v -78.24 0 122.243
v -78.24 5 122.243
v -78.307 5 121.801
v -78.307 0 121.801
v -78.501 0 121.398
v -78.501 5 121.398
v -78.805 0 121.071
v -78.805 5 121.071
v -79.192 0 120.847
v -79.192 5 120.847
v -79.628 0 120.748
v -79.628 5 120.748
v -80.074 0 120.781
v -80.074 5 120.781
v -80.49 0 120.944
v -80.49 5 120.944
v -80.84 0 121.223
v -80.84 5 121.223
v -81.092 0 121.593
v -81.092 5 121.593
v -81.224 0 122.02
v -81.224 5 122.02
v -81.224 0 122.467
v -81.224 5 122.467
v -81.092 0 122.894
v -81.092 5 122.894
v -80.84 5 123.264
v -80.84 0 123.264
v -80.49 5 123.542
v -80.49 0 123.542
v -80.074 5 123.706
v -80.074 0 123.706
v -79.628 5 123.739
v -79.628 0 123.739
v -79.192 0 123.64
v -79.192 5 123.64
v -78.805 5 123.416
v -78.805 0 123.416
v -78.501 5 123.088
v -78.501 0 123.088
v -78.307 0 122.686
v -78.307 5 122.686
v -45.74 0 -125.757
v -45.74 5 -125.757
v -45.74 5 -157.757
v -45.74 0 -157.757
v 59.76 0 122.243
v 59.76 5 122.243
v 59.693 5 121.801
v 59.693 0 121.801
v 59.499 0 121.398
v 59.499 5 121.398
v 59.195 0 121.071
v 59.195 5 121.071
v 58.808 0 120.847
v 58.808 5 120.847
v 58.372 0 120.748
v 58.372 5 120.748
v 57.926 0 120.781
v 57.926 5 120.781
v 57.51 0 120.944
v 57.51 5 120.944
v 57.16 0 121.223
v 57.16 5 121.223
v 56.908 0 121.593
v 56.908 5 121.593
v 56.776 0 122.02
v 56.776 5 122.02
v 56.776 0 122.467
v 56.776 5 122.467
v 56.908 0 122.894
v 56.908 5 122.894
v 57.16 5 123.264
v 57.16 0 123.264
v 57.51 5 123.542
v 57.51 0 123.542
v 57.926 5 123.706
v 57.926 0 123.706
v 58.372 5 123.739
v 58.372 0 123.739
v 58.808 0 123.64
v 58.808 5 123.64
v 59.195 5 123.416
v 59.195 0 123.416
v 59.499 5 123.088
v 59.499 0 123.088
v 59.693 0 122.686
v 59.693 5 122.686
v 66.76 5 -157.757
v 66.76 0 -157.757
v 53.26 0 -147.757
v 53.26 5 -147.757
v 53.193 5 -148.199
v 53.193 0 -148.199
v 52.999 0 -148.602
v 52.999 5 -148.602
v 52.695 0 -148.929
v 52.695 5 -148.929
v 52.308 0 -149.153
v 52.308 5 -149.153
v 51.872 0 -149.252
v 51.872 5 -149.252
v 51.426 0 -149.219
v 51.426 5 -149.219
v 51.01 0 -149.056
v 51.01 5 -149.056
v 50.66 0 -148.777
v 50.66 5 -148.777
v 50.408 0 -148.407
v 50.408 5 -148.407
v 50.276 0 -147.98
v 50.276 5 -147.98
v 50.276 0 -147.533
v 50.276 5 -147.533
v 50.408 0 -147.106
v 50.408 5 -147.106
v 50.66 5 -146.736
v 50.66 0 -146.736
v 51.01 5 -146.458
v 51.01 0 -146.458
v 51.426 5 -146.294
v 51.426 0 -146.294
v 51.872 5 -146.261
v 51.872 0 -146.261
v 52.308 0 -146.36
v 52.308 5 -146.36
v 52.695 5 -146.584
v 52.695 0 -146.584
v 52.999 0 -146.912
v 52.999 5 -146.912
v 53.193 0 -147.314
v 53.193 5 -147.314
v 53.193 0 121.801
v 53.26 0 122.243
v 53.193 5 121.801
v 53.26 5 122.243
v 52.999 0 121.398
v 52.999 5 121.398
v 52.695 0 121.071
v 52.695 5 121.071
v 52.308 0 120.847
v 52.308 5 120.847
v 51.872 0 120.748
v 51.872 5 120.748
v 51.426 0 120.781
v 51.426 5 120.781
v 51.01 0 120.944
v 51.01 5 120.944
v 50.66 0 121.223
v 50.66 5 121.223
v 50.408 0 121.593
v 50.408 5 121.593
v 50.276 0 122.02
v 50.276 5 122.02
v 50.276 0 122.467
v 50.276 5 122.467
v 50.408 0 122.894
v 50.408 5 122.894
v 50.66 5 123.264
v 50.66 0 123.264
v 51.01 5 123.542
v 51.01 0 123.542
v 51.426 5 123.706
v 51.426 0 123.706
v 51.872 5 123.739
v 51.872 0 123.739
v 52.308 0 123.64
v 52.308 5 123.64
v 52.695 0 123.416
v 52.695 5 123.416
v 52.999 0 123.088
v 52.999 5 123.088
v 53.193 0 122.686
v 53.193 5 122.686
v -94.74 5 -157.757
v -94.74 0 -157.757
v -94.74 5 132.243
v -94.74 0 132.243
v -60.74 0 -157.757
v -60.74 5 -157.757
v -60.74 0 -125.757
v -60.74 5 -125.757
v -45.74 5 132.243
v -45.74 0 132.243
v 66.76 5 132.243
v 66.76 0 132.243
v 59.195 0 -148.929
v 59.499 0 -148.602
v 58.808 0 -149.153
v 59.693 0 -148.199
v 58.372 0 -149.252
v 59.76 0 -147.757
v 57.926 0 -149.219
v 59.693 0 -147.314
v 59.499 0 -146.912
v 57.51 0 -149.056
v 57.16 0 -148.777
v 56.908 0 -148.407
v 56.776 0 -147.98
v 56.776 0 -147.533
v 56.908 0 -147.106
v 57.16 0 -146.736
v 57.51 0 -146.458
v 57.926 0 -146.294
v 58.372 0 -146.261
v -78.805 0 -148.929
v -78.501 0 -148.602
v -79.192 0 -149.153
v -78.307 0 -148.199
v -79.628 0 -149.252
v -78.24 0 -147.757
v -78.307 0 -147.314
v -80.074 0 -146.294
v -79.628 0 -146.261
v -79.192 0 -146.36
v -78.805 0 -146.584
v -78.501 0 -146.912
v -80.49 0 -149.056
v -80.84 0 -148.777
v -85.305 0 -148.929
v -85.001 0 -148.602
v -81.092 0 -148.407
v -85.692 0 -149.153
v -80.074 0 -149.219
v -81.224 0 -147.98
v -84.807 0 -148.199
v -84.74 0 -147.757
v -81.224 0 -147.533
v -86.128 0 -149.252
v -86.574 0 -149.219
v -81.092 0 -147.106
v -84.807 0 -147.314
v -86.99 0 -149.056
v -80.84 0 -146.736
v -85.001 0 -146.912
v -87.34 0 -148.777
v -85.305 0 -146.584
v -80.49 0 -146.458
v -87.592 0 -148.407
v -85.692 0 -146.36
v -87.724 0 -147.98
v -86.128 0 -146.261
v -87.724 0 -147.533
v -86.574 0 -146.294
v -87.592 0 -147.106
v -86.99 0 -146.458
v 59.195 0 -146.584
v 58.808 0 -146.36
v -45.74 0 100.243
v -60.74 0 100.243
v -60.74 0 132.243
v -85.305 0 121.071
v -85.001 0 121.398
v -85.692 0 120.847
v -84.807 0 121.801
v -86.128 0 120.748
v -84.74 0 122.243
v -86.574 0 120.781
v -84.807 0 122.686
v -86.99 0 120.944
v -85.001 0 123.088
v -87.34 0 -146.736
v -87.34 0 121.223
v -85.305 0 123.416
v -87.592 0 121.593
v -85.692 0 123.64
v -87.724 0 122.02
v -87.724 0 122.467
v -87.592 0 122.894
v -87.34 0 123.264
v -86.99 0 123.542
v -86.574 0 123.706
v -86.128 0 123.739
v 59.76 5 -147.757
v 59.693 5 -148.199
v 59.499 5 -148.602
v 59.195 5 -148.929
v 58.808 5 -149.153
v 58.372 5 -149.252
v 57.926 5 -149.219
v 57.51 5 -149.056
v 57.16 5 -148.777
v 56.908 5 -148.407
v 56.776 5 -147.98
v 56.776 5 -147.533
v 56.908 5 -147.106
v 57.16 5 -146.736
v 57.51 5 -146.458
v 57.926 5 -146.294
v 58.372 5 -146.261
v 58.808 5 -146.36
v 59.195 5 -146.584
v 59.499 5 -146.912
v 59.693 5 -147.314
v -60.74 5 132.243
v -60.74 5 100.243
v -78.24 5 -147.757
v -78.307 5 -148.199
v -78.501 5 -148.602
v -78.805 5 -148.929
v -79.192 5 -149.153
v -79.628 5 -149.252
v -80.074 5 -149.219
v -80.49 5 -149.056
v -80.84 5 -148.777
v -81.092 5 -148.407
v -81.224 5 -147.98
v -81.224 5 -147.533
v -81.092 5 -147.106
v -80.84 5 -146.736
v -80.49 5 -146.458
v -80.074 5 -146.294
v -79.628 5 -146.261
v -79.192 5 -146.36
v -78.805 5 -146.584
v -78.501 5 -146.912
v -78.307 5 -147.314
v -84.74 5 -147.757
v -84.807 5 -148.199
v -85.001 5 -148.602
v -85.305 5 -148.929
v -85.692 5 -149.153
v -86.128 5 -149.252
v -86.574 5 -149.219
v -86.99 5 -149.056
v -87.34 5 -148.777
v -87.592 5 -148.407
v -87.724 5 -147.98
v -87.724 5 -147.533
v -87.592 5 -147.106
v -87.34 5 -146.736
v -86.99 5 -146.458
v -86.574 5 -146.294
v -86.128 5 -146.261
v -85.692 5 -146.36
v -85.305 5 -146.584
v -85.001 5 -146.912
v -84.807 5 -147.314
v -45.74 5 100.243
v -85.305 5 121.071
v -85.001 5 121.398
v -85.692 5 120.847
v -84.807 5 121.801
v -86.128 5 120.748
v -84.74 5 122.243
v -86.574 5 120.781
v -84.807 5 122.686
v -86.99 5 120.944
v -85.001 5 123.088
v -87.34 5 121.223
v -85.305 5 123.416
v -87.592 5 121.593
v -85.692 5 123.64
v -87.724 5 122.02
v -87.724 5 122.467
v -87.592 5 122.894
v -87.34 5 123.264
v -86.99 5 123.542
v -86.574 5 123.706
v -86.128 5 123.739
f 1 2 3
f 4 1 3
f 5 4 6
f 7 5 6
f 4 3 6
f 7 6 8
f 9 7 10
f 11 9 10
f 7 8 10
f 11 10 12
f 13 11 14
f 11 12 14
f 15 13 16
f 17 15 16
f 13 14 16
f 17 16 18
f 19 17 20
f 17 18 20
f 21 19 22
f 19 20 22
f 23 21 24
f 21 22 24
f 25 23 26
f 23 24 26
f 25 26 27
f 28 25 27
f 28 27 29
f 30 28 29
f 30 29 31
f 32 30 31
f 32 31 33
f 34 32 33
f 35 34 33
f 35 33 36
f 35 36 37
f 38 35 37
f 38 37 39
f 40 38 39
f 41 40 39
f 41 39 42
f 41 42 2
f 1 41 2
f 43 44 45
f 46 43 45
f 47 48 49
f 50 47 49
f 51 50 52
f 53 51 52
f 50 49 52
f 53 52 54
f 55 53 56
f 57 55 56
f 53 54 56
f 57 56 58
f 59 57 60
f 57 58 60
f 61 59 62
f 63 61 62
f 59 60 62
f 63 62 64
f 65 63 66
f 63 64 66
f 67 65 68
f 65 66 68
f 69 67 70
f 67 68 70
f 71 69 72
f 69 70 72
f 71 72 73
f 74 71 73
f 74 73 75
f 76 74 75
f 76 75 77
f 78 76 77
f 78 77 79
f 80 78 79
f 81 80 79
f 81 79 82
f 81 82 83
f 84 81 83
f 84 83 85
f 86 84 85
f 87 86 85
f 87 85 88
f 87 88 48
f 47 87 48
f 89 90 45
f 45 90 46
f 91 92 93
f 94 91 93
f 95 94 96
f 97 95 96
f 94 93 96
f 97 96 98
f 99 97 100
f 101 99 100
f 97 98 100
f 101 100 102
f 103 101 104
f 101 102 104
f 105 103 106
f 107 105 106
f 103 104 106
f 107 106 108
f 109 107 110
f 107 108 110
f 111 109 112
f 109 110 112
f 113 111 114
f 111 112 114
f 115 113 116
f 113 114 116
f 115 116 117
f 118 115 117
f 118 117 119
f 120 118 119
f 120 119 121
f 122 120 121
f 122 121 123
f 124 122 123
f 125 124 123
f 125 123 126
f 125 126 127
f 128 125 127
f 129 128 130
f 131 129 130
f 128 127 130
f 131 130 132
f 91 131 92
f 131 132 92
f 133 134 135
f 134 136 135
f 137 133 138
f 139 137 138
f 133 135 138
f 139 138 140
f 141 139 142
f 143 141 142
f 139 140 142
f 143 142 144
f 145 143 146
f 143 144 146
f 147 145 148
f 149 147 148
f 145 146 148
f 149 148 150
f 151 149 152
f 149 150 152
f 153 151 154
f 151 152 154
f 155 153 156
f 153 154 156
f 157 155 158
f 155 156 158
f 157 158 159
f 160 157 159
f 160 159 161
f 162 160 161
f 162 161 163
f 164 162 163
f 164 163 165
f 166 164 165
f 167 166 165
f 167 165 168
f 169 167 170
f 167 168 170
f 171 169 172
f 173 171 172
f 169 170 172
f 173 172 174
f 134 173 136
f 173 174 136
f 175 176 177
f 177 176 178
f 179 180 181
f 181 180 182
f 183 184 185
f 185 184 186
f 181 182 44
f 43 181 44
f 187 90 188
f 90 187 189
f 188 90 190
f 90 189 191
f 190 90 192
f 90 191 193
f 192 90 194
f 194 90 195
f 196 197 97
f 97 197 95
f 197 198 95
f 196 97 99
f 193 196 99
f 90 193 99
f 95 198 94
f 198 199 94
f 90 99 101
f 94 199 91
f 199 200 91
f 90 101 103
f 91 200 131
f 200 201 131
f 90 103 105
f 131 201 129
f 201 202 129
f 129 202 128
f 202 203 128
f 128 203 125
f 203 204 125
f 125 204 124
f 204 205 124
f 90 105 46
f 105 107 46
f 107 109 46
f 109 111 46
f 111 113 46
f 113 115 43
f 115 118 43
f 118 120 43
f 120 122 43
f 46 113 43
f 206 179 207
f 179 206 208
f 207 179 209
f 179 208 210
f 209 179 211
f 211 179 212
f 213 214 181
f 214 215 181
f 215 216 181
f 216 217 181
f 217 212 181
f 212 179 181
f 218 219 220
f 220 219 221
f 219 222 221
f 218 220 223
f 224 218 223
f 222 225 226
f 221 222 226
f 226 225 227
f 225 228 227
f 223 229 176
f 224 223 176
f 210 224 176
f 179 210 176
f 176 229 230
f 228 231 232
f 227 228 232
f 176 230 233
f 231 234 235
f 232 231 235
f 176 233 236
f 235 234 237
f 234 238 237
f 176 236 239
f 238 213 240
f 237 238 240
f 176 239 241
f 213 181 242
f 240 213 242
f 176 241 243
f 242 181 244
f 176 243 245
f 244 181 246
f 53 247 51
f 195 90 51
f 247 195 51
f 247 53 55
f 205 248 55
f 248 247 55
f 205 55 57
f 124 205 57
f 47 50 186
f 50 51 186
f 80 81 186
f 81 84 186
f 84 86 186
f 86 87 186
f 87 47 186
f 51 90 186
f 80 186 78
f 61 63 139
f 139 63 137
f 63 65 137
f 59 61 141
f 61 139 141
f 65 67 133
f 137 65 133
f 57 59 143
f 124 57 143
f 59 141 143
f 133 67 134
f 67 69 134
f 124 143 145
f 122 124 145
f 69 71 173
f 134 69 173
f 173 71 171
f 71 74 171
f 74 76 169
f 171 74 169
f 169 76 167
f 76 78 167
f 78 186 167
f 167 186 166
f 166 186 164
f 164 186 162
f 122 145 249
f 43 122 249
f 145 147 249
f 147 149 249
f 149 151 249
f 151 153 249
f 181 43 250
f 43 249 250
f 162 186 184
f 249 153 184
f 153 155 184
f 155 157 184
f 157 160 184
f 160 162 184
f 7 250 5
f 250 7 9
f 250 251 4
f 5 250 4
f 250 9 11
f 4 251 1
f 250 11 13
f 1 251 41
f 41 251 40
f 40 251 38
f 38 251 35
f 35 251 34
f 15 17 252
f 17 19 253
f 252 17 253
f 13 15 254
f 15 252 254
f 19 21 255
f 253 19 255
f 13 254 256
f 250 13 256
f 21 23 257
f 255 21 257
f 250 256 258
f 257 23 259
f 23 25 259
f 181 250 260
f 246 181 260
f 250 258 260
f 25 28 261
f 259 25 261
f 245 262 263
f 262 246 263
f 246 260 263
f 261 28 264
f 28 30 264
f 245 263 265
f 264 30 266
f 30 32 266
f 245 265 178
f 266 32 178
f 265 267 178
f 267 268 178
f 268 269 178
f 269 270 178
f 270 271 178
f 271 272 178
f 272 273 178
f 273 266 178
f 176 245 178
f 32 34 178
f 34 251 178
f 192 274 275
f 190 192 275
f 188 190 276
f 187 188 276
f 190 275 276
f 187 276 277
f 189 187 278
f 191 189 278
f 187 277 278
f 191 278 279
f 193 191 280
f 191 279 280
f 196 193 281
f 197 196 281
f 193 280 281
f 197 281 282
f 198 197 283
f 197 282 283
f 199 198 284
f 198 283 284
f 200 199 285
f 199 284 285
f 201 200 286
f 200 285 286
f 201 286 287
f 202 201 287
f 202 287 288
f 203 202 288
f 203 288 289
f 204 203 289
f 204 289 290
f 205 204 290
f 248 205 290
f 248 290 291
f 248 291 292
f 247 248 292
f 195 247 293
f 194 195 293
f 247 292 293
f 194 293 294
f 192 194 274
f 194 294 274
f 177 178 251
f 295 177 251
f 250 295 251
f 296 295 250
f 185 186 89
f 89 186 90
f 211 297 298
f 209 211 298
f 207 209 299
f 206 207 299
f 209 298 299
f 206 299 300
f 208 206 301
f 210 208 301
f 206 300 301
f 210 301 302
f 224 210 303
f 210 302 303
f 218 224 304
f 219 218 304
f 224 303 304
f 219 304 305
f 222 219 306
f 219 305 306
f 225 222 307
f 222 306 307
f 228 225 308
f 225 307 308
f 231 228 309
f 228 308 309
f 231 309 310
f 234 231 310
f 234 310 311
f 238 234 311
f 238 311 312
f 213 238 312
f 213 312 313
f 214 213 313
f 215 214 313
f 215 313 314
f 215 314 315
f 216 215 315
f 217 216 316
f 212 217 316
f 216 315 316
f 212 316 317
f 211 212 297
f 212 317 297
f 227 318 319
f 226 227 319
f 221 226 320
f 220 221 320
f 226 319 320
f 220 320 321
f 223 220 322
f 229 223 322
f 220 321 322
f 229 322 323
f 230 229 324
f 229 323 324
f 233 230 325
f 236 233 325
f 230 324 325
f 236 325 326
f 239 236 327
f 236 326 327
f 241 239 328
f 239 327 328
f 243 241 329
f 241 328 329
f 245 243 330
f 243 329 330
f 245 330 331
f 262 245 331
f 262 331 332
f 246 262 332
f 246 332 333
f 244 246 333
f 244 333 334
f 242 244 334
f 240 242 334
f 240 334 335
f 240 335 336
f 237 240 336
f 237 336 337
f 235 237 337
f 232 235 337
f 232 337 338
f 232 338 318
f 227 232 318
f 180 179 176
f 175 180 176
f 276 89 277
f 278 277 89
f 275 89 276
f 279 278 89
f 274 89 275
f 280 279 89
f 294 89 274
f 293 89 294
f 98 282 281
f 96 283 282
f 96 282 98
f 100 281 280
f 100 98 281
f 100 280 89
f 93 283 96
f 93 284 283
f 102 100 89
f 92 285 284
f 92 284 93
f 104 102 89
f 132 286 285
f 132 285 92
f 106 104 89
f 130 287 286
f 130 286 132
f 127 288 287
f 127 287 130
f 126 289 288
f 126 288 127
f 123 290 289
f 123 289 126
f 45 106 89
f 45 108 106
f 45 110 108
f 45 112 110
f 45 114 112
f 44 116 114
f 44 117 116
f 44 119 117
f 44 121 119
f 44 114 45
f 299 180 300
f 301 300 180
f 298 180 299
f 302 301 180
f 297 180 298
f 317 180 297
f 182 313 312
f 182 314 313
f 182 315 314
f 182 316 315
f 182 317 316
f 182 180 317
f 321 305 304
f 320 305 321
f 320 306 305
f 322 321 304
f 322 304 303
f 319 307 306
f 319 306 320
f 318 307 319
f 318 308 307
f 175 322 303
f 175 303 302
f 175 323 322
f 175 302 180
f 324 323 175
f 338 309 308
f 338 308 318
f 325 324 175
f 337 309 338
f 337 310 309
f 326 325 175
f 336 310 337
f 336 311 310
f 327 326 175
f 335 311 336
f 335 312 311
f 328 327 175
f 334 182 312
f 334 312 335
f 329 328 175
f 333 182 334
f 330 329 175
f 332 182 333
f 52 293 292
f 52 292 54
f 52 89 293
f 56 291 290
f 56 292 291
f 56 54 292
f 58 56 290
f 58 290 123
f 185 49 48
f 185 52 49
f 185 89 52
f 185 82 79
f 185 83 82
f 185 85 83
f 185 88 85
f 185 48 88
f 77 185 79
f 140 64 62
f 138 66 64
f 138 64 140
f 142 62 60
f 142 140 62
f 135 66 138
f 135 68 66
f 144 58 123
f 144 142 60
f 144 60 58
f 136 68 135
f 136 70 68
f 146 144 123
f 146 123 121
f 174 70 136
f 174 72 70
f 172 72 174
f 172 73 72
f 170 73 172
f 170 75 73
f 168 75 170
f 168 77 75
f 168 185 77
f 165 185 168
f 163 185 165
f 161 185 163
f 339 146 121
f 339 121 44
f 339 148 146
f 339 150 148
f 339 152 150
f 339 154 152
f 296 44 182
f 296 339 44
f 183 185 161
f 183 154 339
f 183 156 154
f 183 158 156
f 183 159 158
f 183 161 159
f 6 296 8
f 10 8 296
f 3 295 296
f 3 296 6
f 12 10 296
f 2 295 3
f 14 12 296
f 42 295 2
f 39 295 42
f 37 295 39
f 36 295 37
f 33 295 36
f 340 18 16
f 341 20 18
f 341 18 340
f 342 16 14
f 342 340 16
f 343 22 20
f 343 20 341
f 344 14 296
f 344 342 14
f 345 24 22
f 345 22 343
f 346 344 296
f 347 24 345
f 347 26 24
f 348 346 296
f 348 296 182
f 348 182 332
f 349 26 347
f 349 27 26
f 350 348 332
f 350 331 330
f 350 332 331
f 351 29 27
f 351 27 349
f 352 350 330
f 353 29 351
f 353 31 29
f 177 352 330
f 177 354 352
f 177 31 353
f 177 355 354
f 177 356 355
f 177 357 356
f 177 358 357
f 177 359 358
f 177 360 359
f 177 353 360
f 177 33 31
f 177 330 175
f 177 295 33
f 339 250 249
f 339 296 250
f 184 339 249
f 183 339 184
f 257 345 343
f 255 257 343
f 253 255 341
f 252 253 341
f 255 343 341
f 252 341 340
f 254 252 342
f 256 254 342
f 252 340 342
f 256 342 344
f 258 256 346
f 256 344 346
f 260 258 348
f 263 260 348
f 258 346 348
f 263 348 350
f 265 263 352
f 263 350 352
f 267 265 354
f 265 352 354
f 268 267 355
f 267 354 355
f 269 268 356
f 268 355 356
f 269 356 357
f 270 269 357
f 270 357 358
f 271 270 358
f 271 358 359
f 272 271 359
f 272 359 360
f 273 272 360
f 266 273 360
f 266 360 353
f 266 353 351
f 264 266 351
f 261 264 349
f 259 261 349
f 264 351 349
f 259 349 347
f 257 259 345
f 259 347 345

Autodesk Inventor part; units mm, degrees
ref_plane "YZ Plane" through (0, 0, 0) normal (1, 0, 0) x (0, 1, 0)
ref_plane "XZ Plane" through (0, 0, 0) normal (0, 1, 0) x (-1, 0, 0)
ref_plane "XY Plane" through (0, 0, 0) normal (0, 0, 1) x (1, 0, 0)
sketch "Esquisse1" plane through (0, 0, 0) normal (0, 1, 0) x (-1, 0, 0)
  line L0 (94.7405, 132.2434) -> (-66.7595, 132.2434)
  line L1 (-66.7595, 132.2434) -> (-66.7595, -157.7566)
  line L2 (-66.7595, -157.7566) -> (94.7405, -157.7566)
  line L3 (94.7405, -157.7566) -> (94.7405, 132.2434)
  point P0 (0, 0)
  dimension "d0" = 290
  dimension "d1" = 161.5
extrude "Extrusion1" add sketch "Esquisse1" along normal blind 5
sketch "Esquisse3" plane through (0, 5, 0) normal (0, 1, 0) x (1, 0, 0)
  circle A0 centre (58.2595, 147.7566) radius 1.5 projected
  circle A1 centre (51.7595, 147.7566) radius 1.5 projected
  circle A2 centre (58.2595, -122.2434) radius 1.5 projected
  circle A3 centre (51.7595, -122.2434) radius 1.5 projected
  line L0 (-13.9905, 179.8328) -> (-13.9905, -180.1419)
  line L1 (66.7595, -132.2434) -> (66.7595, 157.7566) projected
  circle A4 centre (-86.2405, 147.7566) radius 1.5
  circle A5 centre (-79.7405, 147.7566) radius 1.5
  circle A6 centre (-86.2405, -122.2434) radius 1.5
  circle A7 centre (-79.7405, -122.2434) radius 1.5
  point P0 (0, 0)
  dimension "d11" = 80.75
extrude "Extrusion3" cut sketch "Esquisse3" against normal up to next
sketch "Esquisse4" plane through (0, 5, 0) normal (0, 1, 0) x (1, 0, 0)
  line L0 (-94.7405, -132.2434) -> (66.7595, -132.2434) projected
  line L1 (-60.7405, -100.2434) -> (-45.7405, -100.2434)
  line L2 (-45.7405, -100.2434) -> (-45.7405, -132.2434)
  line L3 (-45.7405, -132.2434) -> (-60.7405, -132.2434)
  line L4 (-60.7405, -132.2434) -> (-60.7405, -100.2434)
  line L5 (-94.7405, 157.7566) -> (-94.7405, -132.2434) projected
  line L6 (-60.7405, 125.7566) -> (-45.7405, 125.7566)
  line L7 (-45.7405, 125.7566) -> (-45.7405, 157.7566)
  line L8 (-45.7405, 157.7566) -> (-60.7405, 157.7566)
  line L9 (-60.7405, 157.7566) -> (-60.7405, 125.7566)
  line L10 (66.7595, 157.7566) -> (-94.7405, 157.7566) projected
  point P0 (0, 0)
  dimension "d12" = 15
  dimension "d13" = 32
  dimension "d14" = 34
  dimension "d15" = 34
  dimension "d16" = 15
  dimension "d17" = 32
  dimension "d18" = 0
extrude "Extrusion4" cut sketch "Esquisse4" against normal through all
properties part number "étage"
